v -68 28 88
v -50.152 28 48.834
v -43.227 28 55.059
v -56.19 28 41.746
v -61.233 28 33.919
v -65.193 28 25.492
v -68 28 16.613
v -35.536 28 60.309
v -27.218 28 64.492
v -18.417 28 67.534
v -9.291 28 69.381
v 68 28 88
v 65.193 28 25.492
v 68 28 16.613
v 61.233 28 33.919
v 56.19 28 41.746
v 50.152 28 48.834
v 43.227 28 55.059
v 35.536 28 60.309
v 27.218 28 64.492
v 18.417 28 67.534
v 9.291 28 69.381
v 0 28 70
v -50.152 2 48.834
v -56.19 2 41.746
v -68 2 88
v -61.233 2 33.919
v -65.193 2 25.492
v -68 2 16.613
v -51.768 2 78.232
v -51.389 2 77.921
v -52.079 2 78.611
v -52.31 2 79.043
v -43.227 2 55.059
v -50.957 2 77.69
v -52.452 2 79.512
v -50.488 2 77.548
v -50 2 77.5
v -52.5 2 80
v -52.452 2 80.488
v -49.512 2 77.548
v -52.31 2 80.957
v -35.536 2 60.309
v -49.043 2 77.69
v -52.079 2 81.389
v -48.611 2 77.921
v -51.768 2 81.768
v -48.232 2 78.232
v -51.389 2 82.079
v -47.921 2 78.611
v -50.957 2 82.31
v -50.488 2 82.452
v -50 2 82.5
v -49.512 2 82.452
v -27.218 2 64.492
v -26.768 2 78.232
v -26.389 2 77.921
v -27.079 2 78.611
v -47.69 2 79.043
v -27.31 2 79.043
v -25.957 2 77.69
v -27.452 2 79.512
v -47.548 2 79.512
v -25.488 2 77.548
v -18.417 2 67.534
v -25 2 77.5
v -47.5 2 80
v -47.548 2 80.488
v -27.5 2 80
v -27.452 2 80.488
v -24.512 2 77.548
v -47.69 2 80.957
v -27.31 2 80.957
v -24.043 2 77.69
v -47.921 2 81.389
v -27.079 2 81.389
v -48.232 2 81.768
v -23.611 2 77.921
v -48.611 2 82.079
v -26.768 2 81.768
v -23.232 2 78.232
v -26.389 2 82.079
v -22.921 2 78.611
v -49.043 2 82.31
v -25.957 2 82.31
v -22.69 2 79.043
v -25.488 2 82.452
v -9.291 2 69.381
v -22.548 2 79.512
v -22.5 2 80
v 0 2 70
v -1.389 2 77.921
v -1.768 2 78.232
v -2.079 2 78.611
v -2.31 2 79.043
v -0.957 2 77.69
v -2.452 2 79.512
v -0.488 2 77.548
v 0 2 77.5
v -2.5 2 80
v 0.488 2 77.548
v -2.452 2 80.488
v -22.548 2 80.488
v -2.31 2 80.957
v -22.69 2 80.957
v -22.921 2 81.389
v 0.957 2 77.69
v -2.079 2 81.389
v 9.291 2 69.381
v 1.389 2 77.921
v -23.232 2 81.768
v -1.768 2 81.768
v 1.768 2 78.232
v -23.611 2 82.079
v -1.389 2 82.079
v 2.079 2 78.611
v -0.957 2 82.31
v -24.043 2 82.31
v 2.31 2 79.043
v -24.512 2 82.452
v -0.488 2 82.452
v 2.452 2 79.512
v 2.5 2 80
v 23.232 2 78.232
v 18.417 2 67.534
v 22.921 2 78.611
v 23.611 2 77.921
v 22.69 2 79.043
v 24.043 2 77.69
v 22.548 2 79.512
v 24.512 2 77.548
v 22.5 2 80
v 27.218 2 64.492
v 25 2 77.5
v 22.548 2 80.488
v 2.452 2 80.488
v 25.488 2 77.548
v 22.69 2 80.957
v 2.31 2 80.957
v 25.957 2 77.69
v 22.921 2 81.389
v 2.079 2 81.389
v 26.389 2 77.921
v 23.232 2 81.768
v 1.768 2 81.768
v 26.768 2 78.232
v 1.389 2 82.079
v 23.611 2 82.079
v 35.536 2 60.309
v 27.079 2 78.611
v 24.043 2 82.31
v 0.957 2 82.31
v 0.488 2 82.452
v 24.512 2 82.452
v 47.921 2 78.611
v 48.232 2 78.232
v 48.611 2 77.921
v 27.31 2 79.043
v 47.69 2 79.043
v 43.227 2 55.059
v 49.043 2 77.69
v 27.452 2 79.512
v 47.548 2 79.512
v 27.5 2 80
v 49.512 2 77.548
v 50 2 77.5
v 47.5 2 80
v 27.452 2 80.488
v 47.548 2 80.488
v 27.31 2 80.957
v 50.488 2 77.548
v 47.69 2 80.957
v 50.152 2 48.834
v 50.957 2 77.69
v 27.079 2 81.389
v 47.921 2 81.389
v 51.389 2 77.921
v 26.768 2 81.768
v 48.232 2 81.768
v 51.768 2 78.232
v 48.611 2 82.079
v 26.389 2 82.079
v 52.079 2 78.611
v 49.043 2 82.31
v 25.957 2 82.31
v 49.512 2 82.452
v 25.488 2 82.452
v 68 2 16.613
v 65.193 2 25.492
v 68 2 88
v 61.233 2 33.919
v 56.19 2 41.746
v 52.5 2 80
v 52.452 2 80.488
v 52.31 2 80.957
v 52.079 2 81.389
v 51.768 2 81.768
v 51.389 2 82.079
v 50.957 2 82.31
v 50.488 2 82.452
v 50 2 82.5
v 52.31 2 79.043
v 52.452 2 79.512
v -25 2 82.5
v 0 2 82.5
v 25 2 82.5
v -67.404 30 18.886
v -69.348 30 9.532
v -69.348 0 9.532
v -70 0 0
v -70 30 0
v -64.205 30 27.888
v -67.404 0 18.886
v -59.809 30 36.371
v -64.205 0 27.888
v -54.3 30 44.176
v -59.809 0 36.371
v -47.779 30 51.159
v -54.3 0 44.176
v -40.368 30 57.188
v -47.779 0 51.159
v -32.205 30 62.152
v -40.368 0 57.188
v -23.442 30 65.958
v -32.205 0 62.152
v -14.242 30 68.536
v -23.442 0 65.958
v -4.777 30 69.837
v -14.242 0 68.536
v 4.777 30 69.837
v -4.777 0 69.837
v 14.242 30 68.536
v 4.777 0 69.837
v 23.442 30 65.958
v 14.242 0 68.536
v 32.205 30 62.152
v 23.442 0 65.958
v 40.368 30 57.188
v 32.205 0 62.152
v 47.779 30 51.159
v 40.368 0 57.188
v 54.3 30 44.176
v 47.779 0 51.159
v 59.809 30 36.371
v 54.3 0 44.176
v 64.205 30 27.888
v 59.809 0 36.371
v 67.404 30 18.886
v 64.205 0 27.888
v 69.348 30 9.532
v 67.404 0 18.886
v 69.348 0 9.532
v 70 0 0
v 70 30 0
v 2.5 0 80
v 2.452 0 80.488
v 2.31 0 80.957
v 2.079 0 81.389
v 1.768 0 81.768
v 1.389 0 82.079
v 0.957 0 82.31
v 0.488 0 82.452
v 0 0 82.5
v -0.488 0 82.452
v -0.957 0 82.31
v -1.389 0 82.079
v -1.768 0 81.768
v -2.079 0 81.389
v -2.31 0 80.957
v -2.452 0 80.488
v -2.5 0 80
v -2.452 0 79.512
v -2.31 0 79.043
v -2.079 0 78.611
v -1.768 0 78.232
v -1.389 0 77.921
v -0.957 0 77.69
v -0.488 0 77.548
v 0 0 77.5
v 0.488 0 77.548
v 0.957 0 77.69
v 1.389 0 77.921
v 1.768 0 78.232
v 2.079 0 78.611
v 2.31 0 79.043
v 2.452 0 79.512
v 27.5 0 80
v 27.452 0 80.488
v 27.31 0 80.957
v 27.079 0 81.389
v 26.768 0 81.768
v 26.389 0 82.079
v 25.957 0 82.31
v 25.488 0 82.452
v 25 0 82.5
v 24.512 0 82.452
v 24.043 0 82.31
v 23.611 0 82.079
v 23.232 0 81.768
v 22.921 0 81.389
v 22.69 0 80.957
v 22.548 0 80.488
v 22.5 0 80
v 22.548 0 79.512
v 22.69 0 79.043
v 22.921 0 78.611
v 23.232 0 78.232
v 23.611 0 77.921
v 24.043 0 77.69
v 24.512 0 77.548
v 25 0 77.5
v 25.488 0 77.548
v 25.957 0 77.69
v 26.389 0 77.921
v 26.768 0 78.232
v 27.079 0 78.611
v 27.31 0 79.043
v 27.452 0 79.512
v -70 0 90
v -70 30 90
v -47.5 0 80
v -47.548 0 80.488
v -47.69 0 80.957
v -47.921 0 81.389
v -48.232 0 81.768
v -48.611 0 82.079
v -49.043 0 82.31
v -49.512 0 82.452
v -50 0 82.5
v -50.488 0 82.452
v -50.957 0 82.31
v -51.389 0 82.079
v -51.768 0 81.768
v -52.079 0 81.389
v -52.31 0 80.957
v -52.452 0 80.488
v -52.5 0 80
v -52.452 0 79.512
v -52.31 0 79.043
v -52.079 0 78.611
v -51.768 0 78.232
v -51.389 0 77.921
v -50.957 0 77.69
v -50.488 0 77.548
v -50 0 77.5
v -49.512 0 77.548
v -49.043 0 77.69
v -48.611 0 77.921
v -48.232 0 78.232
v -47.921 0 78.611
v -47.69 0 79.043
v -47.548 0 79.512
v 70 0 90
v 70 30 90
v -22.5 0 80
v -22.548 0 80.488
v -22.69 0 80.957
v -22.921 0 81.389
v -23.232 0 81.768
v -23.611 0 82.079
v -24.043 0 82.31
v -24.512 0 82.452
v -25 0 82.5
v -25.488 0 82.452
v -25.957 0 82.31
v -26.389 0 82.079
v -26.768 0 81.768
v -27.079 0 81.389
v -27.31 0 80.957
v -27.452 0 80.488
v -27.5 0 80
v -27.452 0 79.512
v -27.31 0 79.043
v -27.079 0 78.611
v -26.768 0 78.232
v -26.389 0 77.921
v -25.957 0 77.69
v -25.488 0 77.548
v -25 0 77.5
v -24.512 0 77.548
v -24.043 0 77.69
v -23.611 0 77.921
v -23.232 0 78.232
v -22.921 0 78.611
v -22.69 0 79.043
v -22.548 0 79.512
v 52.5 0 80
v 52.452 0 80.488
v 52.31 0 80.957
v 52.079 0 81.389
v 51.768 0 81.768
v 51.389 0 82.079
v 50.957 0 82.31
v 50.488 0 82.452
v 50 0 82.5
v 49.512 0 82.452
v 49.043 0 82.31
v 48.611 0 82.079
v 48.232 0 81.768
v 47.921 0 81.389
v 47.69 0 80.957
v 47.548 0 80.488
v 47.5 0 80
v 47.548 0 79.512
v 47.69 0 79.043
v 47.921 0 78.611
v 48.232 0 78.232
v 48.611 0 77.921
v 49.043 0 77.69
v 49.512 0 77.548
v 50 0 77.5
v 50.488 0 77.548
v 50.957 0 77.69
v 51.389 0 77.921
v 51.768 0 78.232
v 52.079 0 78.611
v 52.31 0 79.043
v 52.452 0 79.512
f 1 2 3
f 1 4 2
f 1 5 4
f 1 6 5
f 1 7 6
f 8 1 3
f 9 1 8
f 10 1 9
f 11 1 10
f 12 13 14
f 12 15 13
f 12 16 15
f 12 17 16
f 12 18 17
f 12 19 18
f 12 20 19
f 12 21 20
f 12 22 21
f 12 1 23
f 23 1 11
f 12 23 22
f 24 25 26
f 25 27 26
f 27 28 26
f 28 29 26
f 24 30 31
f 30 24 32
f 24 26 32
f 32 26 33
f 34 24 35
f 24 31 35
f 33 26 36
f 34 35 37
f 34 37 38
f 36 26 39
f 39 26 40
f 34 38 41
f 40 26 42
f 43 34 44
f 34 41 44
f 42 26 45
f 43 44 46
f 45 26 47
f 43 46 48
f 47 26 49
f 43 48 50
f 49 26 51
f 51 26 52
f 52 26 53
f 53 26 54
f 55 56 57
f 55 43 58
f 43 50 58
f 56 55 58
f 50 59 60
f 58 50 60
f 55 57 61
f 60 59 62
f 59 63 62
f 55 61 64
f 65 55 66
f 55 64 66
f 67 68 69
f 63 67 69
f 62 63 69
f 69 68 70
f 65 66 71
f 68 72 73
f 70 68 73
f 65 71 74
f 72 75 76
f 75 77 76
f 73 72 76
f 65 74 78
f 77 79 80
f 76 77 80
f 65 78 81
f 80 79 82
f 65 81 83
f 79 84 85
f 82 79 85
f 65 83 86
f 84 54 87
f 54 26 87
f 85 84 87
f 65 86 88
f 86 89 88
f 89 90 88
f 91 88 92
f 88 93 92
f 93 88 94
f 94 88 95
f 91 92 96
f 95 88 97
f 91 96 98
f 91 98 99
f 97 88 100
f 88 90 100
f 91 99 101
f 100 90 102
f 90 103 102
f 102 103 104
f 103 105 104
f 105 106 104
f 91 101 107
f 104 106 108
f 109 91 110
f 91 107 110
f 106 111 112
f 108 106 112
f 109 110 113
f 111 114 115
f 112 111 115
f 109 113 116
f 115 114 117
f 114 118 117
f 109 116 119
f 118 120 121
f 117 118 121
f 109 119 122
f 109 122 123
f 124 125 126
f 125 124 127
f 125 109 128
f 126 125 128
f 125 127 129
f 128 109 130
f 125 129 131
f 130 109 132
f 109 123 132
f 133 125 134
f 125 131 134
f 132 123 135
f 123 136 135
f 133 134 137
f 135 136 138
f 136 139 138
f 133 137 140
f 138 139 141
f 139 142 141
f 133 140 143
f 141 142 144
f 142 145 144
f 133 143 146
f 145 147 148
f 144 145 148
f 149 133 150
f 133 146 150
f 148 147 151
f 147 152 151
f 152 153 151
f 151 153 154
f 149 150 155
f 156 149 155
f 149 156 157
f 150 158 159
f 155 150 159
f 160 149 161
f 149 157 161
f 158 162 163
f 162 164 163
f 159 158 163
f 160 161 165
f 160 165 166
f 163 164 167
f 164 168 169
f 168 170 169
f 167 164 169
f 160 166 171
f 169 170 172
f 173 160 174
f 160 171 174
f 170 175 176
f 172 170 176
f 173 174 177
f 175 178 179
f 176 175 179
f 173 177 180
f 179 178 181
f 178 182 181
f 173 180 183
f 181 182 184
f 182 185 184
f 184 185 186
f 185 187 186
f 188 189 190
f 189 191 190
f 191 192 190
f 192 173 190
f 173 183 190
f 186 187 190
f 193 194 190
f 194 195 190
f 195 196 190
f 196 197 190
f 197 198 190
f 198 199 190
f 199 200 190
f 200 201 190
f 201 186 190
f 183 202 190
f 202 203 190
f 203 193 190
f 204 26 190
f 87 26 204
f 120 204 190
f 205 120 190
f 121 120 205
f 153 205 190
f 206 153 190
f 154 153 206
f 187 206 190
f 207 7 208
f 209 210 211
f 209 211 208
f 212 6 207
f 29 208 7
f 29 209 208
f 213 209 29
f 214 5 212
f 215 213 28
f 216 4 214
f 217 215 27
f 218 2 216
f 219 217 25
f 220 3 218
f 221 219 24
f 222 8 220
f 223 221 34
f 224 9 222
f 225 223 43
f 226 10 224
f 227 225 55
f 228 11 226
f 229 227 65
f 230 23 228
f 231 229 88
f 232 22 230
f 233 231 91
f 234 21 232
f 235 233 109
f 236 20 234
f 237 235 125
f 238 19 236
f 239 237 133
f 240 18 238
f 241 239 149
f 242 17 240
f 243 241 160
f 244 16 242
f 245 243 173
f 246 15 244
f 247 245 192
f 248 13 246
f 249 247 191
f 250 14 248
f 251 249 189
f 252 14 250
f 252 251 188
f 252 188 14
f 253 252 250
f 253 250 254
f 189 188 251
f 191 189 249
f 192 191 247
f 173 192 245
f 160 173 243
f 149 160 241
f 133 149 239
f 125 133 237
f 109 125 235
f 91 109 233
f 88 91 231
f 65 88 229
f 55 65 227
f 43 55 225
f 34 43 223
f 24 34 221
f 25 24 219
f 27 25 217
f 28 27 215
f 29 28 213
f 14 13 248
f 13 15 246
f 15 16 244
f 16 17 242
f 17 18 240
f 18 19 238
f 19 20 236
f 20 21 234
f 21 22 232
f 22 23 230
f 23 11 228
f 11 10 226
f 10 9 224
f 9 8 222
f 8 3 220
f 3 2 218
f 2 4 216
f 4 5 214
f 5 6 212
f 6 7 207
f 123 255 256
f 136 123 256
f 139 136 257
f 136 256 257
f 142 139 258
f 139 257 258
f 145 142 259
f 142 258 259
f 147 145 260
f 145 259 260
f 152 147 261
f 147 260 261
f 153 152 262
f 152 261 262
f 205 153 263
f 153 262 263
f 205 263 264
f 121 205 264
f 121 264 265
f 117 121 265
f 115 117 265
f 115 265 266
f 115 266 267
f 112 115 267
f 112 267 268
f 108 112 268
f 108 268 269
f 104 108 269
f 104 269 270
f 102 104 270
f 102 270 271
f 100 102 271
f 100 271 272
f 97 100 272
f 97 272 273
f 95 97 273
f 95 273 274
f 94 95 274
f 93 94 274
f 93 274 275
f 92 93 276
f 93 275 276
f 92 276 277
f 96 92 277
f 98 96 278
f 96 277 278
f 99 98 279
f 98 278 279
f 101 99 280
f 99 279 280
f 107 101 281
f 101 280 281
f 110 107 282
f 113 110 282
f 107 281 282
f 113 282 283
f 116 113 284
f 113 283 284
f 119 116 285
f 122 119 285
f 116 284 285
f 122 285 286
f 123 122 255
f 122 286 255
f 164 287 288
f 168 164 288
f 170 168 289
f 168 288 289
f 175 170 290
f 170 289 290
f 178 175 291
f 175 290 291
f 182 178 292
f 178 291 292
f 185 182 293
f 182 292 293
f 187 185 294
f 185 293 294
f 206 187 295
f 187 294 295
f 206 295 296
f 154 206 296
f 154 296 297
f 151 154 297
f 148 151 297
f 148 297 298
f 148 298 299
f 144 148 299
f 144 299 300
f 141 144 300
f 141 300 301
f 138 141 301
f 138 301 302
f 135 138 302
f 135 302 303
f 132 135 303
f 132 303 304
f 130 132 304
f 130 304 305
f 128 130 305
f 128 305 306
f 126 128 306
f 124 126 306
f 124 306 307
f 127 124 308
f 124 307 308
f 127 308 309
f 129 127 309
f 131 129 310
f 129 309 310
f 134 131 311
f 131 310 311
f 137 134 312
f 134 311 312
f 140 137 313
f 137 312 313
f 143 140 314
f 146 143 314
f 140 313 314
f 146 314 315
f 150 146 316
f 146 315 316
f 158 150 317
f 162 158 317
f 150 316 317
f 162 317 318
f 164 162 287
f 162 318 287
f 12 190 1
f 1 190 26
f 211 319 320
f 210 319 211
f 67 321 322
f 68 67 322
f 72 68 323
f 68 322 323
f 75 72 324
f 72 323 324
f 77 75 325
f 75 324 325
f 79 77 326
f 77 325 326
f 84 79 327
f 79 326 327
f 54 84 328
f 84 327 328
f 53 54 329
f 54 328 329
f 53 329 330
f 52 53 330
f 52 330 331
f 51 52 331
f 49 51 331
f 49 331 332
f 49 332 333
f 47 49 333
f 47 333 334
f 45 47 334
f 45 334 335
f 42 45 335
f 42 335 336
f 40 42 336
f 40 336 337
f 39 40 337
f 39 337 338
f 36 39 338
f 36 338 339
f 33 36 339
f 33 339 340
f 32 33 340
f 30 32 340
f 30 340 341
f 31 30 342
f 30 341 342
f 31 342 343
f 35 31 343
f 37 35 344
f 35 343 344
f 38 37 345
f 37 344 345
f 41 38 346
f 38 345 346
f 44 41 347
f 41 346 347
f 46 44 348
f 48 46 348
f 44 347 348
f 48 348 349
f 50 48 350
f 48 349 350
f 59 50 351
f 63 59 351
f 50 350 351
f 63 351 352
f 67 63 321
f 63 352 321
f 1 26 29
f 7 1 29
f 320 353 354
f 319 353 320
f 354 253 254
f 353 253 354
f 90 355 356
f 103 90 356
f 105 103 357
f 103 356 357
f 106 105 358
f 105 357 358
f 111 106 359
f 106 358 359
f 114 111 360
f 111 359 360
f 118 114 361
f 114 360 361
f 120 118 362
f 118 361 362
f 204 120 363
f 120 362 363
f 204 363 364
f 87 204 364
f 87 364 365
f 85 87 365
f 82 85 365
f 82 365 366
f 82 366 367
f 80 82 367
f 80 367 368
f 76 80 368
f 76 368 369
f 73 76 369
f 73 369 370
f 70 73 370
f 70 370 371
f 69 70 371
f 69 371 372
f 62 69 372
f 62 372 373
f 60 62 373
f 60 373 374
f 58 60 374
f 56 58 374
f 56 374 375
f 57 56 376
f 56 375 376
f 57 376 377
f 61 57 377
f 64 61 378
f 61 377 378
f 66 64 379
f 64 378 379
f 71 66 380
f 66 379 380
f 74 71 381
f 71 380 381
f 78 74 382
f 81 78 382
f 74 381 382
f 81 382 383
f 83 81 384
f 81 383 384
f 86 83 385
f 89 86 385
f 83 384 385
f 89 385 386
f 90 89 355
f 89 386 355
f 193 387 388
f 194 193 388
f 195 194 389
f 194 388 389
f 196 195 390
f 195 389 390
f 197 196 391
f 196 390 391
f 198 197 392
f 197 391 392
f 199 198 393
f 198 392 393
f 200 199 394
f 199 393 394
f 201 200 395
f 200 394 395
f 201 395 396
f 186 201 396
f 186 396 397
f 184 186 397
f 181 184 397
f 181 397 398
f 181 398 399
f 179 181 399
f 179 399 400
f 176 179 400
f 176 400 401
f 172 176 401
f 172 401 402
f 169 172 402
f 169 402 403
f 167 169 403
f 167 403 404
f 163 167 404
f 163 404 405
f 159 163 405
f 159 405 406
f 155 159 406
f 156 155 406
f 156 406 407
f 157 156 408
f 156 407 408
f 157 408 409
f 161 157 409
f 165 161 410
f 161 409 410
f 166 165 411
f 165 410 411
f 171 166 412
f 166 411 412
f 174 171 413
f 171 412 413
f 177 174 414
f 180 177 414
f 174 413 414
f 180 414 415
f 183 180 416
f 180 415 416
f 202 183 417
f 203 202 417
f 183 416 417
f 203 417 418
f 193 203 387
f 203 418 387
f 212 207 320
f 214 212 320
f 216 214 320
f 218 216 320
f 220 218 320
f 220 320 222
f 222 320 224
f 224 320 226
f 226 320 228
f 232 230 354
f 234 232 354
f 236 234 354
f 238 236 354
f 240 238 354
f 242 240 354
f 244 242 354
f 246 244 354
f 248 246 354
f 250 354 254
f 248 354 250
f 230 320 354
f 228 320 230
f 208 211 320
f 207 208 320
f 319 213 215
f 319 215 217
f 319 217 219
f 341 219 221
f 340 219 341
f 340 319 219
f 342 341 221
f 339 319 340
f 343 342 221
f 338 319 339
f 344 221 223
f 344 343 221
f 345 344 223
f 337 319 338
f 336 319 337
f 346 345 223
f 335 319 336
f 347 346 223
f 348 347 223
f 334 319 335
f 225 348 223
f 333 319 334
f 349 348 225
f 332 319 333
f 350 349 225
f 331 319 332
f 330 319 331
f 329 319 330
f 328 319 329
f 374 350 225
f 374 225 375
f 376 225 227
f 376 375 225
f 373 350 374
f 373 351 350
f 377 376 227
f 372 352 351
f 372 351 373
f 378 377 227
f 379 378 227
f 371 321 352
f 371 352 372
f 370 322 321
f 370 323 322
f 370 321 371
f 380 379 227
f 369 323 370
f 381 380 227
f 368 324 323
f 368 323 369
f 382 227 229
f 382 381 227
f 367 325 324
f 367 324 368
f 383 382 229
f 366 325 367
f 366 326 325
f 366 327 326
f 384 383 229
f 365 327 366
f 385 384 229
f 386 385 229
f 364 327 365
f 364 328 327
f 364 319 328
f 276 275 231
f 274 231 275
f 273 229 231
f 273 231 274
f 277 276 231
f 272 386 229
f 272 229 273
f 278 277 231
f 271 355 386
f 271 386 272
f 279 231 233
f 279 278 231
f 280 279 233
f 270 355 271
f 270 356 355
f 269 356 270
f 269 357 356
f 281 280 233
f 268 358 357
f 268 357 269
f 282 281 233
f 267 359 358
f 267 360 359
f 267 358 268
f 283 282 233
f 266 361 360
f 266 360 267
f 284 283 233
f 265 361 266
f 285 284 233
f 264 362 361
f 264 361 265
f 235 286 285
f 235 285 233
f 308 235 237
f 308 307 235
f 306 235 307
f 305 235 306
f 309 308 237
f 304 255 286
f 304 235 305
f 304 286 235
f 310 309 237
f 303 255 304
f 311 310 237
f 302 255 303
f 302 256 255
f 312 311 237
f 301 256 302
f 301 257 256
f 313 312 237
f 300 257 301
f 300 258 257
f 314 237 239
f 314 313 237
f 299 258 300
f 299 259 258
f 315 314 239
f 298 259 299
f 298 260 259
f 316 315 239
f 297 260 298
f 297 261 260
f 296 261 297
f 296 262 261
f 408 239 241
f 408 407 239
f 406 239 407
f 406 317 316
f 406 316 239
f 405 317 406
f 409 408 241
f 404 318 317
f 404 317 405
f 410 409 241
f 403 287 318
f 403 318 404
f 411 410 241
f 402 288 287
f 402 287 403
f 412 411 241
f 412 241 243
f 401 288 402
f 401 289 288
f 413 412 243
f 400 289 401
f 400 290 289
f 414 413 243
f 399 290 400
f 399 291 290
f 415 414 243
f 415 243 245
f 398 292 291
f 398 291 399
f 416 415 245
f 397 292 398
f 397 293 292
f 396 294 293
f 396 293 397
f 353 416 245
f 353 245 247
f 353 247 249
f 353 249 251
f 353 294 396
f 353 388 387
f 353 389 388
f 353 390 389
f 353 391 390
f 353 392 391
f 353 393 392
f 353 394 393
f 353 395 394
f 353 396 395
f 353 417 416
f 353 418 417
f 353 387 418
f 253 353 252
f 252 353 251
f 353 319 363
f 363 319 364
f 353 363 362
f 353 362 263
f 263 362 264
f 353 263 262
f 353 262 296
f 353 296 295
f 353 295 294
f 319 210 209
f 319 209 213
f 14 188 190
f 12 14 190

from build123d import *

# Parameters (mm, degrees)
F0_R     = 2.5
F1_DEPTH = 30
F2_T     = -2
F3_DEPTH = 5


with BuildPart() as f1:
    # F0 (on Front) → F1 (new body)
    with BuildSketch(Plane.XZ):
        with BuildLine():
            ThreePointArc((-70, 0), (0, 70), (70, 0))
            Line((70, 0), (70, 90))
            Line((70, 90), (-70, 90))
            Line((-70, 90), (-70, 0.4057721722))
            Line((-70, 0.4057721722), (-70, 0))
        make_face()
        with Locations((-50, 80)):
            Circle(F0_R, mode=Mode.SUBTRACT)
        with Locations((-25, 80)):
            Circle(F0_R, mode=Mode.SUBTRACT)
        with Locations((0, 80)):
            Circle(F0_R, mode=Mode.SUBTRACT)
        with Locations((25, 80)):
            Circle(F0_R, mode=Mode.SUBTRACT)
        with Locations((50, 80)):
            Circle(F0_R, mode=Mode.SUBTRACT)
        with Locations((50, 80)):
            Circle(F0_R)
        with Locations((25, 80)):
            Circle(F0_R)
        with Locations((0, 80)):
            Circle(F0_R)
        with Locations((-25, 80)):
            Circle(F0_R)
        with Locations((-50, 80)):
            Circle(F0_R)
    extrude(amount=-F1_DEPTH)

    # F2
    f2_openings = [f1.faces().sort_by_distance(p)[0] for p in [
        (0, 15, 70),
    ]]
    offset(amount=F2_T, openings=f2_openings, kind=Kind.INTERSECTION)

    # F0 (on Front) → F3 (cut)
    with BuildSketch(Plane.XZ):
        with Locations((50, 80)):
            Circle(F0_R)
        with Locations((25, 80)):
            Circle(F0_R)
        with Locations((0, 80)):
            Circle(F0_R)
        with Locations((-25, 80)):
            Circle(F0_R)
        with Locations((-50, 80)):
            Circle(F0_R)
    extrude(amount=-F3_DEPTH, mode=Mode.SUBTRACT)


solid = f1.part
